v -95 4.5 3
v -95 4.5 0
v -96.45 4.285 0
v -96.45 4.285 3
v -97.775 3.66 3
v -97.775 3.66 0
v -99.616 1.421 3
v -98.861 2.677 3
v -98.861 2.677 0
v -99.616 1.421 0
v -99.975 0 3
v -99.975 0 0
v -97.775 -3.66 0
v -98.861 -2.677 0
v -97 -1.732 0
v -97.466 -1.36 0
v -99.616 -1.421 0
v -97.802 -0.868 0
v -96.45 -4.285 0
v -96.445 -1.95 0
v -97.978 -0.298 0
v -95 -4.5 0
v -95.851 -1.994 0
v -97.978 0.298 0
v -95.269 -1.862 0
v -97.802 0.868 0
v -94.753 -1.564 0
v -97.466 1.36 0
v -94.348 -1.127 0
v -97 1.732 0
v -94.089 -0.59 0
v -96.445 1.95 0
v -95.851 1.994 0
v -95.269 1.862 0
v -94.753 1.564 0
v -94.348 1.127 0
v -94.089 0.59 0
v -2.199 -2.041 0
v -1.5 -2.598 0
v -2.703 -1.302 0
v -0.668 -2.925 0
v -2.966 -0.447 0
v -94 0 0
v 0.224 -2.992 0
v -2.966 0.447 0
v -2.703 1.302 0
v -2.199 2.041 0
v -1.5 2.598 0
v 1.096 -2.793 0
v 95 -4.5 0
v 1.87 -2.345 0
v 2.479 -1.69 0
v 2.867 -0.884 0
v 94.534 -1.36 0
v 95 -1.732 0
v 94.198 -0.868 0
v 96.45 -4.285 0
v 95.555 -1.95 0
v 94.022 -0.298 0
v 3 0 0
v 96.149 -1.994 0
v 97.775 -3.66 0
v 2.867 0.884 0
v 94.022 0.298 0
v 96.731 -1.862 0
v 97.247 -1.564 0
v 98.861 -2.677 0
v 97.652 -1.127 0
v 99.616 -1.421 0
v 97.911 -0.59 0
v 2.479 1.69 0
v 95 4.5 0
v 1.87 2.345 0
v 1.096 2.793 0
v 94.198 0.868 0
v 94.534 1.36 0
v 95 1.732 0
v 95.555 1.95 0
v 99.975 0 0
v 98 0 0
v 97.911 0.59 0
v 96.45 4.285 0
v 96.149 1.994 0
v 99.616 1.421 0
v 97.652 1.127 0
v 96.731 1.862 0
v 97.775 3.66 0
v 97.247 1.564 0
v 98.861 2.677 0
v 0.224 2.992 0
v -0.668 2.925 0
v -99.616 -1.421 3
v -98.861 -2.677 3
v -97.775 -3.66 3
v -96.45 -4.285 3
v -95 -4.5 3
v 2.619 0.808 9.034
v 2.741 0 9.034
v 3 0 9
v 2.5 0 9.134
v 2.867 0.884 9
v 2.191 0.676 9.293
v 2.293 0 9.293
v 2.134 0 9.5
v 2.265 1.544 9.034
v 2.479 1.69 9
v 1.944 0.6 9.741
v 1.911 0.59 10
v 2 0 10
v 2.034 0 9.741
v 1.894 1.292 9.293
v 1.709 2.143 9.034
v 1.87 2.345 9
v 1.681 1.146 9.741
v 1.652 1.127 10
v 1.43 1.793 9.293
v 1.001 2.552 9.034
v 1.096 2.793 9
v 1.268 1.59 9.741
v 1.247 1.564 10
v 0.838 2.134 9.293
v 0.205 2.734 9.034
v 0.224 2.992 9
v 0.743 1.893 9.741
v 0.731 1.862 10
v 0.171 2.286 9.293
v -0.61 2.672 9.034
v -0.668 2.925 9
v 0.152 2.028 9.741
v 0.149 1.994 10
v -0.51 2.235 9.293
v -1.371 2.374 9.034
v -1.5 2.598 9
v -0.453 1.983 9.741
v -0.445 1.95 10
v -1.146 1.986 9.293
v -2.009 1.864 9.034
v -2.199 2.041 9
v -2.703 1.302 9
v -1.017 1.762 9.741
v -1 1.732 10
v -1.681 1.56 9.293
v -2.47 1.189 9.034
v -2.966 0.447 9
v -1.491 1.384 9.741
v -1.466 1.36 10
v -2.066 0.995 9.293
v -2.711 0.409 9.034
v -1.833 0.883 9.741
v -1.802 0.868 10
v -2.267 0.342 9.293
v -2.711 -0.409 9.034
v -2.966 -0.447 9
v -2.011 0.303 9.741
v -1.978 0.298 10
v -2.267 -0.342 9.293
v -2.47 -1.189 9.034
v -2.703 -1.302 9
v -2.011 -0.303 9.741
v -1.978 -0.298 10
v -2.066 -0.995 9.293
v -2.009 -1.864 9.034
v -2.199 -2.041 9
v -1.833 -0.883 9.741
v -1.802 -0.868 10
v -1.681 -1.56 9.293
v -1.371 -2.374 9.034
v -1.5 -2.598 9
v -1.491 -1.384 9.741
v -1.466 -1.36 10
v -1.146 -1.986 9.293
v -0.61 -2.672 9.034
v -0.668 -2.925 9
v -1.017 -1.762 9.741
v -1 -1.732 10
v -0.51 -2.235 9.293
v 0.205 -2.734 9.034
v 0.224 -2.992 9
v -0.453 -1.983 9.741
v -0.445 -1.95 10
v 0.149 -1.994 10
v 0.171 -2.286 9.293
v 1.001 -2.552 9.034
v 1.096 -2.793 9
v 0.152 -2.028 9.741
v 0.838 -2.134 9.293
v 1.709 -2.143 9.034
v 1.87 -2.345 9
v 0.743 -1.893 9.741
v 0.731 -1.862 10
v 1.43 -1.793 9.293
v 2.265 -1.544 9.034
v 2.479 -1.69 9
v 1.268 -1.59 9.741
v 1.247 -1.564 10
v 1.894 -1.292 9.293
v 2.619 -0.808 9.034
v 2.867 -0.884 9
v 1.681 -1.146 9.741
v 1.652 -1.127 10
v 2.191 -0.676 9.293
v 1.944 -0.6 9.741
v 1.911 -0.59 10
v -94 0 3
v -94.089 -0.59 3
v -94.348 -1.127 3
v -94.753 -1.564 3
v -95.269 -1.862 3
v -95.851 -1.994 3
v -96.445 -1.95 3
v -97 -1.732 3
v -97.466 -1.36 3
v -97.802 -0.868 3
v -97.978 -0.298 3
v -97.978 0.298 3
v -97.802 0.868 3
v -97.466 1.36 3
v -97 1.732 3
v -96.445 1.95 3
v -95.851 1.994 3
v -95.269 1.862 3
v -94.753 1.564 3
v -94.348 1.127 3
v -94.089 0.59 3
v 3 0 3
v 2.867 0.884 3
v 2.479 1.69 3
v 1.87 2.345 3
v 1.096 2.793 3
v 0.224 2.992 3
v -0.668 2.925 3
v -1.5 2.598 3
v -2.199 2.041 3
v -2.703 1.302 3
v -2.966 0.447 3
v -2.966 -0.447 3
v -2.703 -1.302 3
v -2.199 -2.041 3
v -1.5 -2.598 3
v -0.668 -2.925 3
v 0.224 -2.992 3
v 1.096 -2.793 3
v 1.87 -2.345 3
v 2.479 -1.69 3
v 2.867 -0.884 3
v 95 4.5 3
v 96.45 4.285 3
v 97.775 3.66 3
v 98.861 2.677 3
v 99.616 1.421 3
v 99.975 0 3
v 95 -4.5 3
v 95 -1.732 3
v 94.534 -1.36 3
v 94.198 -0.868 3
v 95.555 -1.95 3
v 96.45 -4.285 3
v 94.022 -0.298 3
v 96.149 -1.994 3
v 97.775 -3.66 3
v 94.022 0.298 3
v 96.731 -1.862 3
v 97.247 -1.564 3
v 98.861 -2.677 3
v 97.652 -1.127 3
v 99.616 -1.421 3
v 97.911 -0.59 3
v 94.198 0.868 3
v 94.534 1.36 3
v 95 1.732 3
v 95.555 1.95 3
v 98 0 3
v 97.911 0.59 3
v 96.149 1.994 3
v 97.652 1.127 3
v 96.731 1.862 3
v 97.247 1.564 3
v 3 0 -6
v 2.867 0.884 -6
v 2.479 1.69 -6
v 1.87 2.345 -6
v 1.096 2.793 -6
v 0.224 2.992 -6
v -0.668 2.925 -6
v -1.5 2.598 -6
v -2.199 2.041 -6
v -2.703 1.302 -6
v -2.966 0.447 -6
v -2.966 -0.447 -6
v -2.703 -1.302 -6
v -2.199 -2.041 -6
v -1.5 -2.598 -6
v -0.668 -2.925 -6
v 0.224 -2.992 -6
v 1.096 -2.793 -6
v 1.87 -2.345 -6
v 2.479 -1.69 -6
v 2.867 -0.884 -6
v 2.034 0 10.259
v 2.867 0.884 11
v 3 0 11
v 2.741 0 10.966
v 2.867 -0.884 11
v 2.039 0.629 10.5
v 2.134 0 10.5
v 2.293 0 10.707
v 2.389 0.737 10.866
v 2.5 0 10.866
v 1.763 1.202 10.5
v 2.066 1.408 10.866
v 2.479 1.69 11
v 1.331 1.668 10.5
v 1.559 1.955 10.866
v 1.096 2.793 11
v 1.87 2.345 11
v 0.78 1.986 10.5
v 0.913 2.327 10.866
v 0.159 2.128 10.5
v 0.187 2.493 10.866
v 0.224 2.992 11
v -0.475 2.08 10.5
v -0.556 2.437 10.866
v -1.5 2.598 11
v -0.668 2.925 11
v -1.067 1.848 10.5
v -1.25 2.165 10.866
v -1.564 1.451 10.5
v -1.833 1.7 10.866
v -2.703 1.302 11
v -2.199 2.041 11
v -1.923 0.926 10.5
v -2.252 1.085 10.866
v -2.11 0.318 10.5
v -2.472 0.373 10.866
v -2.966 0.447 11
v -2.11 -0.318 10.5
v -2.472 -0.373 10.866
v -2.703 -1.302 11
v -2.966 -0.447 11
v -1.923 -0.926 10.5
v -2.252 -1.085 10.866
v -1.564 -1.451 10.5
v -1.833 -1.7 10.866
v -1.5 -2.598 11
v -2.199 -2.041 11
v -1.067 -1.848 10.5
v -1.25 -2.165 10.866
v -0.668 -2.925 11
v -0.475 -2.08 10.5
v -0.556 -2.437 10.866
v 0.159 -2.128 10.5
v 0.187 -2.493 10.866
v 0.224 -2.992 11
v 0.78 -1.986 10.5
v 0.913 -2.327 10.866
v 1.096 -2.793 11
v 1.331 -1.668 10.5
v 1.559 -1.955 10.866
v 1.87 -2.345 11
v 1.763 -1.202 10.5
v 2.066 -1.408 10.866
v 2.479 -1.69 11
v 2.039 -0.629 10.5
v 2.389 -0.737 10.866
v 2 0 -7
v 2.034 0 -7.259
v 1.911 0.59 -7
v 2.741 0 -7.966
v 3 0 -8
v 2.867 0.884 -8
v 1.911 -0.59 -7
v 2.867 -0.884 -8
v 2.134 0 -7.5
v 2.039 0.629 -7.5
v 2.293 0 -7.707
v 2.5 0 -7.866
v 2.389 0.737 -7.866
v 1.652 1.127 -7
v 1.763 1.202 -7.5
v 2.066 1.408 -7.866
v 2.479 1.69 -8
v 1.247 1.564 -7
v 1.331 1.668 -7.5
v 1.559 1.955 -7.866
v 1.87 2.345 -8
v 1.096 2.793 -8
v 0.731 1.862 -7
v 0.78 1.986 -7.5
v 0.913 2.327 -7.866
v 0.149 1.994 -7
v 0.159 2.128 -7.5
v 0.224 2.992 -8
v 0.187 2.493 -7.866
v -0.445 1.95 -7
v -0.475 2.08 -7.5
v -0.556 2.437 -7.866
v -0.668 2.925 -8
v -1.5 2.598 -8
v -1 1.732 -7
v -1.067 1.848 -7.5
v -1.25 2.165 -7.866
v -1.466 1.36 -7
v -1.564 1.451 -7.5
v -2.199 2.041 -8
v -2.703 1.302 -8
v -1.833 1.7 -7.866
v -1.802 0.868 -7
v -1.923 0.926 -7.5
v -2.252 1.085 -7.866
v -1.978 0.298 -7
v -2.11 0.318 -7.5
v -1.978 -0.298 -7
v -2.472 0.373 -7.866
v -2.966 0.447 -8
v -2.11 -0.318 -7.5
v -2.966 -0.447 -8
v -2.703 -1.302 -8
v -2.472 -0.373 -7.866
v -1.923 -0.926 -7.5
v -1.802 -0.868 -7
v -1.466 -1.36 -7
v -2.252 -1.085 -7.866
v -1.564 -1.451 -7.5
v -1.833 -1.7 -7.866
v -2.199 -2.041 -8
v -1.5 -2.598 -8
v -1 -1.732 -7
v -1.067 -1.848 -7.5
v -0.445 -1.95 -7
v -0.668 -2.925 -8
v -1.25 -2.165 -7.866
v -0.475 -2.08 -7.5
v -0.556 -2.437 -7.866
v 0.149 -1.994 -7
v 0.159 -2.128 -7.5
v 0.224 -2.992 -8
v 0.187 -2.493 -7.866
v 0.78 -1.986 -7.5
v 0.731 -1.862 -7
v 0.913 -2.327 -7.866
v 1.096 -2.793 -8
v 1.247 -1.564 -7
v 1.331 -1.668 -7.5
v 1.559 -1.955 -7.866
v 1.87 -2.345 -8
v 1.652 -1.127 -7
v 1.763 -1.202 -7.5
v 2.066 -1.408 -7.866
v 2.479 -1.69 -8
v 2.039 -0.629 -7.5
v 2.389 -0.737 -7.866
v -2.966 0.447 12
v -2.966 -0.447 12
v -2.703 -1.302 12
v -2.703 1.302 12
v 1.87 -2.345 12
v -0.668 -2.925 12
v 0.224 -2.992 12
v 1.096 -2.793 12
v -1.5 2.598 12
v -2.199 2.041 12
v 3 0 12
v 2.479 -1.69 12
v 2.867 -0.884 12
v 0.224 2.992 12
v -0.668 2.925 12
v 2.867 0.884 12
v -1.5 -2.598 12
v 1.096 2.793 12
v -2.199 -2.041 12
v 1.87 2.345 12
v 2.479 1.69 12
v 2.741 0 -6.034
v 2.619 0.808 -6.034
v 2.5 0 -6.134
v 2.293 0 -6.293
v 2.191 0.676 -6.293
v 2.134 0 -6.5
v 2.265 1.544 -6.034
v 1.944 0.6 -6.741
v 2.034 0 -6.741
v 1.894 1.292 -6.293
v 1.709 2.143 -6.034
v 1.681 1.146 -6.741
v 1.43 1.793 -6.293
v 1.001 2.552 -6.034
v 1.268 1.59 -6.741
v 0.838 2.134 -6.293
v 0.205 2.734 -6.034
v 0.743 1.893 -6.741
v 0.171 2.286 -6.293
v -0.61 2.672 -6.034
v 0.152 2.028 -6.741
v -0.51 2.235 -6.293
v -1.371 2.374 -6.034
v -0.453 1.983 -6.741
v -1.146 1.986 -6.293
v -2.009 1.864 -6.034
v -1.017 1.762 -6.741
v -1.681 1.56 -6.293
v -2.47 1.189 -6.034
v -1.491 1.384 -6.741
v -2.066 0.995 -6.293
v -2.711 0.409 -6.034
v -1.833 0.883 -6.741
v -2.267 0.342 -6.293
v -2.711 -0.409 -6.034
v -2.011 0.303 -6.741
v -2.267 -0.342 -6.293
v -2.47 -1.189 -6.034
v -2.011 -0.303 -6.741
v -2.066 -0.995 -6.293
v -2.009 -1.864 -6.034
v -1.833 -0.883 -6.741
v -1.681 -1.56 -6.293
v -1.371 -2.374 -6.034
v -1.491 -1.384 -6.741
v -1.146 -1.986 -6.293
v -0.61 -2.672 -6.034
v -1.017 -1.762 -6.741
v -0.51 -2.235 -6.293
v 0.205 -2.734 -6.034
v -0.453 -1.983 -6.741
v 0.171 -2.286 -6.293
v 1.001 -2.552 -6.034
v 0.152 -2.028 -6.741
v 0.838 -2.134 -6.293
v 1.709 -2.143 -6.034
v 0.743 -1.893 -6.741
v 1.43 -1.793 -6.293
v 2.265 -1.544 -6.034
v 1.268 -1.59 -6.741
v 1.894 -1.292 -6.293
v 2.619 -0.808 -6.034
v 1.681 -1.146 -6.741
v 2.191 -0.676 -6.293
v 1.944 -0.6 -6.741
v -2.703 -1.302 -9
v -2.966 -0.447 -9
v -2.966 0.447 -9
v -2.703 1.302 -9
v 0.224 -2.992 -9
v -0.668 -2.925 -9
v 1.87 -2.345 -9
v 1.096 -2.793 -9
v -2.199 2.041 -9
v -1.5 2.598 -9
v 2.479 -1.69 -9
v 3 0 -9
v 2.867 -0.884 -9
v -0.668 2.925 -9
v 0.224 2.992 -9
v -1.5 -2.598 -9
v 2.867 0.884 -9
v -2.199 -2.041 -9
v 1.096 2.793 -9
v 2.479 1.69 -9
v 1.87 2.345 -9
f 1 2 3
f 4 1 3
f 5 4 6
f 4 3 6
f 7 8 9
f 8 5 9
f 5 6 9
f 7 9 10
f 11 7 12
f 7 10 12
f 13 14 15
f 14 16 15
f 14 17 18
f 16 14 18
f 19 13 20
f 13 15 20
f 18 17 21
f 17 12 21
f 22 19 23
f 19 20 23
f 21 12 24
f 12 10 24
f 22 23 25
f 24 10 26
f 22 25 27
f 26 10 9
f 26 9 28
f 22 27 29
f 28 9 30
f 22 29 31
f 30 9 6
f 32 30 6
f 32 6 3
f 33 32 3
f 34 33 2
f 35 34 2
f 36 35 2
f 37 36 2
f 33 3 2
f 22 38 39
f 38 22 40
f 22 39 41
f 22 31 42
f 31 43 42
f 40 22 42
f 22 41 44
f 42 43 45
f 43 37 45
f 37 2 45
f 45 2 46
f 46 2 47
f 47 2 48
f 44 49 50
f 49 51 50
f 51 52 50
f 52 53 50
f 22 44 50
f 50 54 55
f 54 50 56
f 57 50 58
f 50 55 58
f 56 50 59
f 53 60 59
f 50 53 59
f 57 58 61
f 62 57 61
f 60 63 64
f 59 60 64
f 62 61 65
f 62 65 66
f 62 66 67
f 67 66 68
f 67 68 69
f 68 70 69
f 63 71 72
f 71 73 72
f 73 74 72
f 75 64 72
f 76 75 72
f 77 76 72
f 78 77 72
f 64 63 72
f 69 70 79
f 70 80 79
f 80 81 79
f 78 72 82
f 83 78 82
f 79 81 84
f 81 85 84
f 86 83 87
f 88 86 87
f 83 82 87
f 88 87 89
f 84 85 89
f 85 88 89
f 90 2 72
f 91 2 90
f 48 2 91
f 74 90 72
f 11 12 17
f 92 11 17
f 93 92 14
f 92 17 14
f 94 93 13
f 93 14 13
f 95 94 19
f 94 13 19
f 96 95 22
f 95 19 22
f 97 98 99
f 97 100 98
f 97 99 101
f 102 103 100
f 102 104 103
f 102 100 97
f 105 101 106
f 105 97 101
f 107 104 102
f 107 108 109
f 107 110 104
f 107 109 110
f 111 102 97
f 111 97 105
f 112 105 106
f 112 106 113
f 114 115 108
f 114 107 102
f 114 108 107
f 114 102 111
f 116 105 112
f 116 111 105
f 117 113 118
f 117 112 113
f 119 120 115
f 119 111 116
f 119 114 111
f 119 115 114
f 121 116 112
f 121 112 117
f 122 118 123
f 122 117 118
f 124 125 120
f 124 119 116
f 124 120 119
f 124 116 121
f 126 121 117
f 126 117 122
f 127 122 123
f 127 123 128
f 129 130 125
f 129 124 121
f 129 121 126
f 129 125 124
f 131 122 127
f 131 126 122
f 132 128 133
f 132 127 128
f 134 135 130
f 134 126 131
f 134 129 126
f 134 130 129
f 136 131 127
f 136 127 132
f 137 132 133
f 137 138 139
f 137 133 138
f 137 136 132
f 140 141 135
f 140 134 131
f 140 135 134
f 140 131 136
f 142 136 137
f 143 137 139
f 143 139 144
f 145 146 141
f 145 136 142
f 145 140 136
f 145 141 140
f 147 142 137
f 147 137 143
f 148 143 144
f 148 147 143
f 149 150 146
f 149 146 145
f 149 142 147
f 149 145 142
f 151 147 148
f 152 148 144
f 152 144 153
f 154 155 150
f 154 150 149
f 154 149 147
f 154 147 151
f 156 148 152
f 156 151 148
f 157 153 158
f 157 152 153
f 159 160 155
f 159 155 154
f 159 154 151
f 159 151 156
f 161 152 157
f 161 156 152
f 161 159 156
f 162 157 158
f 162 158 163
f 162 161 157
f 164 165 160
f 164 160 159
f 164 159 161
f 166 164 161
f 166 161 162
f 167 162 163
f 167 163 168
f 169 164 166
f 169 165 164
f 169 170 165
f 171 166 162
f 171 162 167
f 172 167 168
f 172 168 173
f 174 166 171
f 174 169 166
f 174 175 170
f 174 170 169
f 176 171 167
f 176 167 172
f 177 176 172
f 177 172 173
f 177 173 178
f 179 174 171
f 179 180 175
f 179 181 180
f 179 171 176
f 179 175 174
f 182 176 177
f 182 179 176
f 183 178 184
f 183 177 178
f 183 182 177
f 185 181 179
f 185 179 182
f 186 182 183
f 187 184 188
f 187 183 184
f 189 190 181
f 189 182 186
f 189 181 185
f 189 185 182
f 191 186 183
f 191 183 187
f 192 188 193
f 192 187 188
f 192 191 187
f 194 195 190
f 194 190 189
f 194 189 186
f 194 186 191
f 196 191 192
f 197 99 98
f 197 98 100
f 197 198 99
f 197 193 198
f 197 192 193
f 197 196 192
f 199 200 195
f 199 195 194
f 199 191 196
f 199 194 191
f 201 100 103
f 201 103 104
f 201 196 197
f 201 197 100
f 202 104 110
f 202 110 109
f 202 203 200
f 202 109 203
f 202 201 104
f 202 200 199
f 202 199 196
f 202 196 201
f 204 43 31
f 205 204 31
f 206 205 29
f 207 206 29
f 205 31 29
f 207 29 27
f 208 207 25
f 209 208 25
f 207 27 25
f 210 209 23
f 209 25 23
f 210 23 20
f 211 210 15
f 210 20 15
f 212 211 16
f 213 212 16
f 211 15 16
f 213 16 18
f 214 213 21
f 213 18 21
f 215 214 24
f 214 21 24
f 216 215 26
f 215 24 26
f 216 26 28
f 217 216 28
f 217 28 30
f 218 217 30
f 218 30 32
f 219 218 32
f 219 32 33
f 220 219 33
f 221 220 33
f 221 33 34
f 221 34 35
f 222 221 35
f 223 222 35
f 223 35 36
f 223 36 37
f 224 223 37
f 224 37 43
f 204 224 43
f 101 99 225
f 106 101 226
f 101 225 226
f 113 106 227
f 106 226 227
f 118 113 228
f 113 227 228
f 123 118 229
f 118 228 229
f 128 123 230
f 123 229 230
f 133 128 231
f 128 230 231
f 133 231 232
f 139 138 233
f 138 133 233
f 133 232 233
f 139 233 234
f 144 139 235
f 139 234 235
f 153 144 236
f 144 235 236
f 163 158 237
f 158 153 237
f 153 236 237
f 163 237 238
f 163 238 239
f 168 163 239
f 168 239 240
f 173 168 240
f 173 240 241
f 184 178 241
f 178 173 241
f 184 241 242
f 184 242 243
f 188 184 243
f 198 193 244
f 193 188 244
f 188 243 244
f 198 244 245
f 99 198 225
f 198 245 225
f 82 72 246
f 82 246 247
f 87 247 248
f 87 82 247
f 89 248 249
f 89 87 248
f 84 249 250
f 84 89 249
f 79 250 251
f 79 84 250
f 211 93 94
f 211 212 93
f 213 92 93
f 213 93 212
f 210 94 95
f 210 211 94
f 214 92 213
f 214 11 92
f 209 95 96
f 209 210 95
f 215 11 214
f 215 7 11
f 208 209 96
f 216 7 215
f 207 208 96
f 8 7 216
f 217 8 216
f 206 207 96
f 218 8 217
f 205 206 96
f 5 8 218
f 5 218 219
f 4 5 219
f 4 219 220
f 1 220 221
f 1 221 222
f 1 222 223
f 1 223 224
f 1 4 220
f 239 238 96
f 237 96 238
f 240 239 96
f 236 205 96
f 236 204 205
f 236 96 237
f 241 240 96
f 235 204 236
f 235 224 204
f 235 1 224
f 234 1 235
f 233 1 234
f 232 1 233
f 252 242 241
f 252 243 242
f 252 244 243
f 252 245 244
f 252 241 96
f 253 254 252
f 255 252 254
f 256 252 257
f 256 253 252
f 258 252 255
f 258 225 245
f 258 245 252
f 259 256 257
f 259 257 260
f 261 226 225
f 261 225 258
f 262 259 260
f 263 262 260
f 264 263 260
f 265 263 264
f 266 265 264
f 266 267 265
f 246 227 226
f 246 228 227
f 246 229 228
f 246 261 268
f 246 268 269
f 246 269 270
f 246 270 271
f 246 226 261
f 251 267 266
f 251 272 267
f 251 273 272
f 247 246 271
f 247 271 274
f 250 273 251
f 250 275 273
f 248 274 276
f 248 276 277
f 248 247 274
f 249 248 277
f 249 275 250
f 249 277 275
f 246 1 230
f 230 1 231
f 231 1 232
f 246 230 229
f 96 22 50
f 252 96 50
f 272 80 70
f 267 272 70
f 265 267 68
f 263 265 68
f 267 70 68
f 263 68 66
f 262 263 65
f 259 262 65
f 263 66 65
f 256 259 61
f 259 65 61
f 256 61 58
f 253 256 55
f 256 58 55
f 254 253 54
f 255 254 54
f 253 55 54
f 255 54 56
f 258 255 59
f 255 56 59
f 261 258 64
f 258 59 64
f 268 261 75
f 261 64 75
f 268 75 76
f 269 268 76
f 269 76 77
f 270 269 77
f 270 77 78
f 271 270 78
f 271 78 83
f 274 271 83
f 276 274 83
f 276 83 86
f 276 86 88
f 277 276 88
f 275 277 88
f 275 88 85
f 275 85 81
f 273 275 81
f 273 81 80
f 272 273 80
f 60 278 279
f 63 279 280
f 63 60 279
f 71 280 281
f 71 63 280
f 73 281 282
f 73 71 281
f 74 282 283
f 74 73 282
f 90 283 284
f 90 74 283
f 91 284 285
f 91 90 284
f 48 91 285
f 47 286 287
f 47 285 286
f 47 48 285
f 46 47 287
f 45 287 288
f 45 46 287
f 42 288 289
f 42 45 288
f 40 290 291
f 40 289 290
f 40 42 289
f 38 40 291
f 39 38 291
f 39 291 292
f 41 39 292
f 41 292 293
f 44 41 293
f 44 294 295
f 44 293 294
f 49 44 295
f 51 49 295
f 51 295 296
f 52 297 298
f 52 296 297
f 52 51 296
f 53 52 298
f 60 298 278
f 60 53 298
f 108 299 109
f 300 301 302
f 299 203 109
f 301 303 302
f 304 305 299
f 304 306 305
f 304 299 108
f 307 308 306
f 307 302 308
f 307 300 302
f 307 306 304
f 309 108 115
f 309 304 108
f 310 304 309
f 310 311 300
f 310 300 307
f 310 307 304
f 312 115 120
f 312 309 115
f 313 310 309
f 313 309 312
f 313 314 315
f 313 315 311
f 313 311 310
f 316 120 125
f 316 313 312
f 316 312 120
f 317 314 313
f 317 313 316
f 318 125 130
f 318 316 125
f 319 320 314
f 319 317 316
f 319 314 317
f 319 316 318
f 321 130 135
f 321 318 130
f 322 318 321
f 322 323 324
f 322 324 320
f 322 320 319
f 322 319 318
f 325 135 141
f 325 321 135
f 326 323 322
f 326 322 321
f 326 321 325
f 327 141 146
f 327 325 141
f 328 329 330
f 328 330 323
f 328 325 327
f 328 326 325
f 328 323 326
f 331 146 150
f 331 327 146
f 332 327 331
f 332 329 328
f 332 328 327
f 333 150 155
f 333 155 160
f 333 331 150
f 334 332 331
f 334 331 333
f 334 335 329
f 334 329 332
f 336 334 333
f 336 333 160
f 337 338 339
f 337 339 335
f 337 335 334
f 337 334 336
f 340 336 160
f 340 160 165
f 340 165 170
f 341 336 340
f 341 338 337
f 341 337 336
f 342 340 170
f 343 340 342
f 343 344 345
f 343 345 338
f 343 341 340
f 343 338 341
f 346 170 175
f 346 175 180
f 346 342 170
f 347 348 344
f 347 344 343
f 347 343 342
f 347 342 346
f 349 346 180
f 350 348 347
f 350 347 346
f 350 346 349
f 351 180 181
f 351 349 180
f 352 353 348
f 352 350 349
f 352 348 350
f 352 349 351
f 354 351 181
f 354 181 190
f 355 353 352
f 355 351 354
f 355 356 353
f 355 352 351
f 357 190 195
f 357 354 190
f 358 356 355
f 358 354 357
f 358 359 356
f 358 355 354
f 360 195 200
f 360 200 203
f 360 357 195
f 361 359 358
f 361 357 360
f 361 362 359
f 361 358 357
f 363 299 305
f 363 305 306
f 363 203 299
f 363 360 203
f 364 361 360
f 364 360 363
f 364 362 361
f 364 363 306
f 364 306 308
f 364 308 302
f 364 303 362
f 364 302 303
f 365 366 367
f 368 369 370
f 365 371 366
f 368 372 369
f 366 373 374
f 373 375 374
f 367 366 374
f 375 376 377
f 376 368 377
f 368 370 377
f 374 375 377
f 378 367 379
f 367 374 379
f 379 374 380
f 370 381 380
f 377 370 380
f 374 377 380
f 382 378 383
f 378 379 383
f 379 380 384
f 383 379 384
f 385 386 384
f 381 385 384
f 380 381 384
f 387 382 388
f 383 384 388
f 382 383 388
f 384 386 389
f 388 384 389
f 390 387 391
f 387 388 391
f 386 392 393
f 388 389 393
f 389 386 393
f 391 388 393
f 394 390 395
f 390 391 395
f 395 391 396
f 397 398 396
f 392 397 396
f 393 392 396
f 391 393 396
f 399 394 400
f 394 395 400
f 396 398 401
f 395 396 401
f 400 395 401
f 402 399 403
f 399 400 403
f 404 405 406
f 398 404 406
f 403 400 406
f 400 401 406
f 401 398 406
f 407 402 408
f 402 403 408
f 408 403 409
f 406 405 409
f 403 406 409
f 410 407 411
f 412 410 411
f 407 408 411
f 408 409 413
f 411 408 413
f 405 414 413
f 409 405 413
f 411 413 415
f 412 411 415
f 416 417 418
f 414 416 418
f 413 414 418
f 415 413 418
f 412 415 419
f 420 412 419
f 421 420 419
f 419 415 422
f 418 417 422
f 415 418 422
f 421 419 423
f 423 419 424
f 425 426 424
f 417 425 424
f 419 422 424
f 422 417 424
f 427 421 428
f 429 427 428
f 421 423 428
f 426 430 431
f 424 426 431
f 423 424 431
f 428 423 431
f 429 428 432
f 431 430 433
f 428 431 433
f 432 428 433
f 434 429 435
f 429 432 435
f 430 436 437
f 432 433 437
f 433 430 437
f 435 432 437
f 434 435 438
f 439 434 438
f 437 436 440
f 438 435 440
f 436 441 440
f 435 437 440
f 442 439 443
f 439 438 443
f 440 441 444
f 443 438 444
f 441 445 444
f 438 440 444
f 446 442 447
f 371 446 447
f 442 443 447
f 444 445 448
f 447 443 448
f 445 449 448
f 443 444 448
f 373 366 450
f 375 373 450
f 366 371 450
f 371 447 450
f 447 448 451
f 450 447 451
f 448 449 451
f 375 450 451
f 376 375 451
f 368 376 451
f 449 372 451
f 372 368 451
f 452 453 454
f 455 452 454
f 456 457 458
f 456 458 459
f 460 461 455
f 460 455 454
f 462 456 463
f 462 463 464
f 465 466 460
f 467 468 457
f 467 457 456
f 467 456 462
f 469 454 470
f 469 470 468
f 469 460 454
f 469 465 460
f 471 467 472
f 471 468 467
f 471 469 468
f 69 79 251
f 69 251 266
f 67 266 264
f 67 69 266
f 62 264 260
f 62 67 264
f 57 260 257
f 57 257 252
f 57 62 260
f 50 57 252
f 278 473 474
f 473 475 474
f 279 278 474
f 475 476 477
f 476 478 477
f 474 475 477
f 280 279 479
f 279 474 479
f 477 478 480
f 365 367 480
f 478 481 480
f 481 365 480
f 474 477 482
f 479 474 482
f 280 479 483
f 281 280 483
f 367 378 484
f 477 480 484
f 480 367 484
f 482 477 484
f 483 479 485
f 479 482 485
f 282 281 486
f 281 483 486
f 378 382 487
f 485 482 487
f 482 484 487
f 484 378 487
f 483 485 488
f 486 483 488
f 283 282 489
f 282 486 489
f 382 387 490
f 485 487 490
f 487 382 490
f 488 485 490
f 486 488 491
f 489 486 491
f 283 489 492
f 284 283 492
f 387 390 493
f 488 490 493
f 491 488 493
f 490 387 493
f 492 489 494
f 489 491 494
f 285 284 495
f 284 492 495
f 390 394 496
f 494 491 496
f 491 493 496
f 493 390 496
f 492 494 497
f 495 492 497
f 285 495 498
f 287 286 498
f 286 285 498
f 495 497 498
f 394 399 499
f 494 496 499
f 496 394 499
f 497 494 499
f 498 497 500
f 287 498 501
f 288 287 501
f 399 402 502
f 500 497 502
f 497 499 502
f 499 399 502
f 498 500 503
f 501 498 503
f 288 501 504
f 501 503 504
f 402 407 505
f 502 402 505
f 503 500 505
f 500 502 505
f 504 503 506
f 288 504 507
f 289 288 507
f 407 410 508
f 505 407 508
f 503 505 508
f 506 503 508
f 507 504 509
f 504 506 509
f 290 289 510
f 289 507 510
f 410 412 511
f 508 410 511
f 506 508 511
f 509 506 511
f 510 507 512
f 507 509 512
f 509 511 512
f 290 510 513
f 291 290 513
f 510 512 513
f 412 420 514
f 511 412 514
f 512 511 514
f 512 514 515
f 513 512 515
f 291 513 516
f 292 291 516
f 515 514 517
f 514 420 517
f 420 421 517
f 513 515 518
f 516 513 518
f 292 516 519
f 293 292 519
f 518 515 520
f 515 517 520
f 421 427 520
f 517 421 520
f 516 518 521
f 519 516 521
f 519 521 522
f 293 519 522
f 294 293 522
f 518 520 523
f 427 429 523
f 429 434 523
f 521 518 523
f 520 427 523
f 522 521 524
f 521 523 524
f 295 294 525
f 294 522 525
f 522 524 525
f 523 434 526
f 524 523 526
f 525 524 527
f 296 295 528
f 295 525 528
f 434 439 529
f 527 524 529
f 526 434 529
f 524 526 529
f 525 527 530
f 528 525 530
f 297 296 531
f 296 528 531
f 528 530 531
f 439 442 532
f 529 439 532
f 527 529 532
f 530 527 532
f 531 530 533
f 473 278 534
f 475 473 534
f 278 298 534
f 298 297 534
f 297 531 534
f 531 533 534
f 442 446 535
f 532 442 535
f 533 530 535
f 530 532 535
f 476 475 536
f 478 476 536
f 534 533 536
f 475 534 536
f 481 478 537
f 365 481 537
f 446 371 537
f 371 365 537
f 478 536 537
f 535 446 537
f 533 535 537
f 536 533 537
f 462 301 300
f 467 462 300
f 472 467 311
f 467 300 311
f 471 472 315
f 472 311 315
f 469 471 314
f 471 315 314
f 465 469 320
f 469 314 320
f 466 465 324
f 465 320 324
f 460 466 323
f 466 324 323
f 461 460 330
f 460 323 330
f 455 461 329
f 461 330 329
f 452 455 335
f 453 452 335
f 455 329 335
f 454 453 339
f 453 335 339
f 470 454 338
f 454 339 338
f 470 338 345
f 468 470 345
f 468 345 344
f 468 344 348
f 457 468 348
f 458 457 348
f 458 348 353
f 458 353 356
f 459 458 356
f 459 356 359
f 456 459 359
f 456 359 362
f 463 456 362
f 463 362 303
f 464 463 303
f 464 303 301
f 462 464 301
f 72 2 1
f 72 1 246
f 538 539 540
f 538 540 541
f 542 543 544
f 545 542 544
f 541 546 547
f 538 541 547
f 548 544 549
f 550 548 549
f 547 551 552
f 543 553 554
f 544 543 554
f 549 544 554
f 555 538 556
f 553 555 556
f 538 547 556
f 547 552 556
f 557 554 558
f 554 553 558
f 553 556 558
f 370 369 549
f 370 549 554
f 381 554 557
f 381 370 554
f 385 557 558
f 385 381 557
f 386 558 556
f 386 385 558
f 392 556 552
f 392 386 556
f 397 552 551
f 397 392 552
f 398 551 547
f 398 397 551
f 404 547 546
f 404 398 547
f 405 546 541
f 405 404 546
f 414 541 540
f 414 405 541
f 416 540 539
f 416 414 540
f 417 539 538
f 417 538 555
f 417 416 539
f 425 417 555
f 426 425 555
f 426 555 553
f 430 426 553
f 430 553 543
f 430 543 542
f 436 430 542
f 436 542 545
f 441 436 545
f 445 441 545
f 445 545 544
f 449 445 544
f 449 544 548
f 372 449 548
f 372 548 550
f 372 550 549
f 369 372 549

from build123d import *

# Parameters (mm, degrees)
F0_W        = 200
F0_H        = 9
F1_DEPTH    = 3
F2_R        = 2
F3_DEPTH    = 25
F4_T1_DEPTH = 28
F5_R        = 3
F6_DEPTH    = 9
F8_R        = 1


# Not quite as in the source:
# - a fillet or chamfer that OpenCascade refuses, or shapes differently, is made with other operations: its cross-section is extruded or revolved along the edge and cut away or added


with BuildPart() as f1:
    # F0 (on Top) → F1 (new body)
    with BuildSketch(Plane.XY):
        Rectangle(F0_W, F0_H)
    extrude(amount=F1_DEPTH)

    # F2 (on face) → F3 (cut)
    with BuildSketch(Plane(origin=(0, 0, 0), x_dir=(1, 0, 0), z_dir=(0, 0, -1))):
        with Locations((-96, 0)):
            Circle(F2_R)
        with Locations((96, 0)):
            Circle(F2_R)
    extrude(amount=-F3_DEPTH, mode=Mode.SUBTRACT)

    # F4: fillet of radius 5 on 4 edges, made by hand

    # F4_s2 → F4_t1 (cut)
    with BuildSketch(Plane.XY.offset(-12.5)):
        with BuildLine():
            ThreePointArc((95, 4.5), (98.5355339059, 3.0355339059), (100, -0.5))
            Line((100, -0.5), (100, 4.5))
            Line((100, 4.5), (95, 4.5))
        make_face()
        with BuildLine():
            ThreePointArc((100, 0.5), (98.5355339059, -3.0355339059), (95, -4.5))
            Line((95, -4.5), (100, -4.5))
            Line((100, -4.5), (100, 0.5))
        make_face()
        with BuildLine():
            ThreePointArc((-95, 4.5), (-98.5355339059, 3.0355339059), (-100, -0.5))
            Line((-100, -0.5), (-100, 4.5))
            Line((-100, 4.5), (-95, 4.5))
        make_face()
        with BuildLine():
            ThreePointArc((-100, 0.5), (-98.5355339059, -3.0355339059), (-95, -4.5))
            Line((-95, -4.5), (-100, -4.5))
            Line((-100, -4.5), (-100, 0.5))
        make_face()
    extrude(amount=F4_T1_DEPTH, mode=Mode.SUBTRACT)

    # F5 (on face) → F6 (join)
    with BuildSketch(Plane.XY.offset(3)):
        Circle(F5_R)
    extrude(amount=F6_DEPTH)

    # F8 (on face) → F9 (revolve, cut)
    with BuildSketch(Plane(origin=(0, 0, 0), x_dir=(-1, 0, 0), z_dir=(0, 1, 0))):
        with Locations((-3, 10)):
            Circle(F8_R)
    revolve(axis=Axis((0, 0, 12), (0, 0, 1)), mode=Mode.SUBTRACT)

    # F14: F1 across plane


with BuildPart() as f1_1:
    add(f1.part)
    add(f1.part.mirror(Plane(origin=(95, -4.5, 1.5), x_dir=(-1, 0, 0), z_dir=(0, 0, 1))))


solid = f1_1.part
